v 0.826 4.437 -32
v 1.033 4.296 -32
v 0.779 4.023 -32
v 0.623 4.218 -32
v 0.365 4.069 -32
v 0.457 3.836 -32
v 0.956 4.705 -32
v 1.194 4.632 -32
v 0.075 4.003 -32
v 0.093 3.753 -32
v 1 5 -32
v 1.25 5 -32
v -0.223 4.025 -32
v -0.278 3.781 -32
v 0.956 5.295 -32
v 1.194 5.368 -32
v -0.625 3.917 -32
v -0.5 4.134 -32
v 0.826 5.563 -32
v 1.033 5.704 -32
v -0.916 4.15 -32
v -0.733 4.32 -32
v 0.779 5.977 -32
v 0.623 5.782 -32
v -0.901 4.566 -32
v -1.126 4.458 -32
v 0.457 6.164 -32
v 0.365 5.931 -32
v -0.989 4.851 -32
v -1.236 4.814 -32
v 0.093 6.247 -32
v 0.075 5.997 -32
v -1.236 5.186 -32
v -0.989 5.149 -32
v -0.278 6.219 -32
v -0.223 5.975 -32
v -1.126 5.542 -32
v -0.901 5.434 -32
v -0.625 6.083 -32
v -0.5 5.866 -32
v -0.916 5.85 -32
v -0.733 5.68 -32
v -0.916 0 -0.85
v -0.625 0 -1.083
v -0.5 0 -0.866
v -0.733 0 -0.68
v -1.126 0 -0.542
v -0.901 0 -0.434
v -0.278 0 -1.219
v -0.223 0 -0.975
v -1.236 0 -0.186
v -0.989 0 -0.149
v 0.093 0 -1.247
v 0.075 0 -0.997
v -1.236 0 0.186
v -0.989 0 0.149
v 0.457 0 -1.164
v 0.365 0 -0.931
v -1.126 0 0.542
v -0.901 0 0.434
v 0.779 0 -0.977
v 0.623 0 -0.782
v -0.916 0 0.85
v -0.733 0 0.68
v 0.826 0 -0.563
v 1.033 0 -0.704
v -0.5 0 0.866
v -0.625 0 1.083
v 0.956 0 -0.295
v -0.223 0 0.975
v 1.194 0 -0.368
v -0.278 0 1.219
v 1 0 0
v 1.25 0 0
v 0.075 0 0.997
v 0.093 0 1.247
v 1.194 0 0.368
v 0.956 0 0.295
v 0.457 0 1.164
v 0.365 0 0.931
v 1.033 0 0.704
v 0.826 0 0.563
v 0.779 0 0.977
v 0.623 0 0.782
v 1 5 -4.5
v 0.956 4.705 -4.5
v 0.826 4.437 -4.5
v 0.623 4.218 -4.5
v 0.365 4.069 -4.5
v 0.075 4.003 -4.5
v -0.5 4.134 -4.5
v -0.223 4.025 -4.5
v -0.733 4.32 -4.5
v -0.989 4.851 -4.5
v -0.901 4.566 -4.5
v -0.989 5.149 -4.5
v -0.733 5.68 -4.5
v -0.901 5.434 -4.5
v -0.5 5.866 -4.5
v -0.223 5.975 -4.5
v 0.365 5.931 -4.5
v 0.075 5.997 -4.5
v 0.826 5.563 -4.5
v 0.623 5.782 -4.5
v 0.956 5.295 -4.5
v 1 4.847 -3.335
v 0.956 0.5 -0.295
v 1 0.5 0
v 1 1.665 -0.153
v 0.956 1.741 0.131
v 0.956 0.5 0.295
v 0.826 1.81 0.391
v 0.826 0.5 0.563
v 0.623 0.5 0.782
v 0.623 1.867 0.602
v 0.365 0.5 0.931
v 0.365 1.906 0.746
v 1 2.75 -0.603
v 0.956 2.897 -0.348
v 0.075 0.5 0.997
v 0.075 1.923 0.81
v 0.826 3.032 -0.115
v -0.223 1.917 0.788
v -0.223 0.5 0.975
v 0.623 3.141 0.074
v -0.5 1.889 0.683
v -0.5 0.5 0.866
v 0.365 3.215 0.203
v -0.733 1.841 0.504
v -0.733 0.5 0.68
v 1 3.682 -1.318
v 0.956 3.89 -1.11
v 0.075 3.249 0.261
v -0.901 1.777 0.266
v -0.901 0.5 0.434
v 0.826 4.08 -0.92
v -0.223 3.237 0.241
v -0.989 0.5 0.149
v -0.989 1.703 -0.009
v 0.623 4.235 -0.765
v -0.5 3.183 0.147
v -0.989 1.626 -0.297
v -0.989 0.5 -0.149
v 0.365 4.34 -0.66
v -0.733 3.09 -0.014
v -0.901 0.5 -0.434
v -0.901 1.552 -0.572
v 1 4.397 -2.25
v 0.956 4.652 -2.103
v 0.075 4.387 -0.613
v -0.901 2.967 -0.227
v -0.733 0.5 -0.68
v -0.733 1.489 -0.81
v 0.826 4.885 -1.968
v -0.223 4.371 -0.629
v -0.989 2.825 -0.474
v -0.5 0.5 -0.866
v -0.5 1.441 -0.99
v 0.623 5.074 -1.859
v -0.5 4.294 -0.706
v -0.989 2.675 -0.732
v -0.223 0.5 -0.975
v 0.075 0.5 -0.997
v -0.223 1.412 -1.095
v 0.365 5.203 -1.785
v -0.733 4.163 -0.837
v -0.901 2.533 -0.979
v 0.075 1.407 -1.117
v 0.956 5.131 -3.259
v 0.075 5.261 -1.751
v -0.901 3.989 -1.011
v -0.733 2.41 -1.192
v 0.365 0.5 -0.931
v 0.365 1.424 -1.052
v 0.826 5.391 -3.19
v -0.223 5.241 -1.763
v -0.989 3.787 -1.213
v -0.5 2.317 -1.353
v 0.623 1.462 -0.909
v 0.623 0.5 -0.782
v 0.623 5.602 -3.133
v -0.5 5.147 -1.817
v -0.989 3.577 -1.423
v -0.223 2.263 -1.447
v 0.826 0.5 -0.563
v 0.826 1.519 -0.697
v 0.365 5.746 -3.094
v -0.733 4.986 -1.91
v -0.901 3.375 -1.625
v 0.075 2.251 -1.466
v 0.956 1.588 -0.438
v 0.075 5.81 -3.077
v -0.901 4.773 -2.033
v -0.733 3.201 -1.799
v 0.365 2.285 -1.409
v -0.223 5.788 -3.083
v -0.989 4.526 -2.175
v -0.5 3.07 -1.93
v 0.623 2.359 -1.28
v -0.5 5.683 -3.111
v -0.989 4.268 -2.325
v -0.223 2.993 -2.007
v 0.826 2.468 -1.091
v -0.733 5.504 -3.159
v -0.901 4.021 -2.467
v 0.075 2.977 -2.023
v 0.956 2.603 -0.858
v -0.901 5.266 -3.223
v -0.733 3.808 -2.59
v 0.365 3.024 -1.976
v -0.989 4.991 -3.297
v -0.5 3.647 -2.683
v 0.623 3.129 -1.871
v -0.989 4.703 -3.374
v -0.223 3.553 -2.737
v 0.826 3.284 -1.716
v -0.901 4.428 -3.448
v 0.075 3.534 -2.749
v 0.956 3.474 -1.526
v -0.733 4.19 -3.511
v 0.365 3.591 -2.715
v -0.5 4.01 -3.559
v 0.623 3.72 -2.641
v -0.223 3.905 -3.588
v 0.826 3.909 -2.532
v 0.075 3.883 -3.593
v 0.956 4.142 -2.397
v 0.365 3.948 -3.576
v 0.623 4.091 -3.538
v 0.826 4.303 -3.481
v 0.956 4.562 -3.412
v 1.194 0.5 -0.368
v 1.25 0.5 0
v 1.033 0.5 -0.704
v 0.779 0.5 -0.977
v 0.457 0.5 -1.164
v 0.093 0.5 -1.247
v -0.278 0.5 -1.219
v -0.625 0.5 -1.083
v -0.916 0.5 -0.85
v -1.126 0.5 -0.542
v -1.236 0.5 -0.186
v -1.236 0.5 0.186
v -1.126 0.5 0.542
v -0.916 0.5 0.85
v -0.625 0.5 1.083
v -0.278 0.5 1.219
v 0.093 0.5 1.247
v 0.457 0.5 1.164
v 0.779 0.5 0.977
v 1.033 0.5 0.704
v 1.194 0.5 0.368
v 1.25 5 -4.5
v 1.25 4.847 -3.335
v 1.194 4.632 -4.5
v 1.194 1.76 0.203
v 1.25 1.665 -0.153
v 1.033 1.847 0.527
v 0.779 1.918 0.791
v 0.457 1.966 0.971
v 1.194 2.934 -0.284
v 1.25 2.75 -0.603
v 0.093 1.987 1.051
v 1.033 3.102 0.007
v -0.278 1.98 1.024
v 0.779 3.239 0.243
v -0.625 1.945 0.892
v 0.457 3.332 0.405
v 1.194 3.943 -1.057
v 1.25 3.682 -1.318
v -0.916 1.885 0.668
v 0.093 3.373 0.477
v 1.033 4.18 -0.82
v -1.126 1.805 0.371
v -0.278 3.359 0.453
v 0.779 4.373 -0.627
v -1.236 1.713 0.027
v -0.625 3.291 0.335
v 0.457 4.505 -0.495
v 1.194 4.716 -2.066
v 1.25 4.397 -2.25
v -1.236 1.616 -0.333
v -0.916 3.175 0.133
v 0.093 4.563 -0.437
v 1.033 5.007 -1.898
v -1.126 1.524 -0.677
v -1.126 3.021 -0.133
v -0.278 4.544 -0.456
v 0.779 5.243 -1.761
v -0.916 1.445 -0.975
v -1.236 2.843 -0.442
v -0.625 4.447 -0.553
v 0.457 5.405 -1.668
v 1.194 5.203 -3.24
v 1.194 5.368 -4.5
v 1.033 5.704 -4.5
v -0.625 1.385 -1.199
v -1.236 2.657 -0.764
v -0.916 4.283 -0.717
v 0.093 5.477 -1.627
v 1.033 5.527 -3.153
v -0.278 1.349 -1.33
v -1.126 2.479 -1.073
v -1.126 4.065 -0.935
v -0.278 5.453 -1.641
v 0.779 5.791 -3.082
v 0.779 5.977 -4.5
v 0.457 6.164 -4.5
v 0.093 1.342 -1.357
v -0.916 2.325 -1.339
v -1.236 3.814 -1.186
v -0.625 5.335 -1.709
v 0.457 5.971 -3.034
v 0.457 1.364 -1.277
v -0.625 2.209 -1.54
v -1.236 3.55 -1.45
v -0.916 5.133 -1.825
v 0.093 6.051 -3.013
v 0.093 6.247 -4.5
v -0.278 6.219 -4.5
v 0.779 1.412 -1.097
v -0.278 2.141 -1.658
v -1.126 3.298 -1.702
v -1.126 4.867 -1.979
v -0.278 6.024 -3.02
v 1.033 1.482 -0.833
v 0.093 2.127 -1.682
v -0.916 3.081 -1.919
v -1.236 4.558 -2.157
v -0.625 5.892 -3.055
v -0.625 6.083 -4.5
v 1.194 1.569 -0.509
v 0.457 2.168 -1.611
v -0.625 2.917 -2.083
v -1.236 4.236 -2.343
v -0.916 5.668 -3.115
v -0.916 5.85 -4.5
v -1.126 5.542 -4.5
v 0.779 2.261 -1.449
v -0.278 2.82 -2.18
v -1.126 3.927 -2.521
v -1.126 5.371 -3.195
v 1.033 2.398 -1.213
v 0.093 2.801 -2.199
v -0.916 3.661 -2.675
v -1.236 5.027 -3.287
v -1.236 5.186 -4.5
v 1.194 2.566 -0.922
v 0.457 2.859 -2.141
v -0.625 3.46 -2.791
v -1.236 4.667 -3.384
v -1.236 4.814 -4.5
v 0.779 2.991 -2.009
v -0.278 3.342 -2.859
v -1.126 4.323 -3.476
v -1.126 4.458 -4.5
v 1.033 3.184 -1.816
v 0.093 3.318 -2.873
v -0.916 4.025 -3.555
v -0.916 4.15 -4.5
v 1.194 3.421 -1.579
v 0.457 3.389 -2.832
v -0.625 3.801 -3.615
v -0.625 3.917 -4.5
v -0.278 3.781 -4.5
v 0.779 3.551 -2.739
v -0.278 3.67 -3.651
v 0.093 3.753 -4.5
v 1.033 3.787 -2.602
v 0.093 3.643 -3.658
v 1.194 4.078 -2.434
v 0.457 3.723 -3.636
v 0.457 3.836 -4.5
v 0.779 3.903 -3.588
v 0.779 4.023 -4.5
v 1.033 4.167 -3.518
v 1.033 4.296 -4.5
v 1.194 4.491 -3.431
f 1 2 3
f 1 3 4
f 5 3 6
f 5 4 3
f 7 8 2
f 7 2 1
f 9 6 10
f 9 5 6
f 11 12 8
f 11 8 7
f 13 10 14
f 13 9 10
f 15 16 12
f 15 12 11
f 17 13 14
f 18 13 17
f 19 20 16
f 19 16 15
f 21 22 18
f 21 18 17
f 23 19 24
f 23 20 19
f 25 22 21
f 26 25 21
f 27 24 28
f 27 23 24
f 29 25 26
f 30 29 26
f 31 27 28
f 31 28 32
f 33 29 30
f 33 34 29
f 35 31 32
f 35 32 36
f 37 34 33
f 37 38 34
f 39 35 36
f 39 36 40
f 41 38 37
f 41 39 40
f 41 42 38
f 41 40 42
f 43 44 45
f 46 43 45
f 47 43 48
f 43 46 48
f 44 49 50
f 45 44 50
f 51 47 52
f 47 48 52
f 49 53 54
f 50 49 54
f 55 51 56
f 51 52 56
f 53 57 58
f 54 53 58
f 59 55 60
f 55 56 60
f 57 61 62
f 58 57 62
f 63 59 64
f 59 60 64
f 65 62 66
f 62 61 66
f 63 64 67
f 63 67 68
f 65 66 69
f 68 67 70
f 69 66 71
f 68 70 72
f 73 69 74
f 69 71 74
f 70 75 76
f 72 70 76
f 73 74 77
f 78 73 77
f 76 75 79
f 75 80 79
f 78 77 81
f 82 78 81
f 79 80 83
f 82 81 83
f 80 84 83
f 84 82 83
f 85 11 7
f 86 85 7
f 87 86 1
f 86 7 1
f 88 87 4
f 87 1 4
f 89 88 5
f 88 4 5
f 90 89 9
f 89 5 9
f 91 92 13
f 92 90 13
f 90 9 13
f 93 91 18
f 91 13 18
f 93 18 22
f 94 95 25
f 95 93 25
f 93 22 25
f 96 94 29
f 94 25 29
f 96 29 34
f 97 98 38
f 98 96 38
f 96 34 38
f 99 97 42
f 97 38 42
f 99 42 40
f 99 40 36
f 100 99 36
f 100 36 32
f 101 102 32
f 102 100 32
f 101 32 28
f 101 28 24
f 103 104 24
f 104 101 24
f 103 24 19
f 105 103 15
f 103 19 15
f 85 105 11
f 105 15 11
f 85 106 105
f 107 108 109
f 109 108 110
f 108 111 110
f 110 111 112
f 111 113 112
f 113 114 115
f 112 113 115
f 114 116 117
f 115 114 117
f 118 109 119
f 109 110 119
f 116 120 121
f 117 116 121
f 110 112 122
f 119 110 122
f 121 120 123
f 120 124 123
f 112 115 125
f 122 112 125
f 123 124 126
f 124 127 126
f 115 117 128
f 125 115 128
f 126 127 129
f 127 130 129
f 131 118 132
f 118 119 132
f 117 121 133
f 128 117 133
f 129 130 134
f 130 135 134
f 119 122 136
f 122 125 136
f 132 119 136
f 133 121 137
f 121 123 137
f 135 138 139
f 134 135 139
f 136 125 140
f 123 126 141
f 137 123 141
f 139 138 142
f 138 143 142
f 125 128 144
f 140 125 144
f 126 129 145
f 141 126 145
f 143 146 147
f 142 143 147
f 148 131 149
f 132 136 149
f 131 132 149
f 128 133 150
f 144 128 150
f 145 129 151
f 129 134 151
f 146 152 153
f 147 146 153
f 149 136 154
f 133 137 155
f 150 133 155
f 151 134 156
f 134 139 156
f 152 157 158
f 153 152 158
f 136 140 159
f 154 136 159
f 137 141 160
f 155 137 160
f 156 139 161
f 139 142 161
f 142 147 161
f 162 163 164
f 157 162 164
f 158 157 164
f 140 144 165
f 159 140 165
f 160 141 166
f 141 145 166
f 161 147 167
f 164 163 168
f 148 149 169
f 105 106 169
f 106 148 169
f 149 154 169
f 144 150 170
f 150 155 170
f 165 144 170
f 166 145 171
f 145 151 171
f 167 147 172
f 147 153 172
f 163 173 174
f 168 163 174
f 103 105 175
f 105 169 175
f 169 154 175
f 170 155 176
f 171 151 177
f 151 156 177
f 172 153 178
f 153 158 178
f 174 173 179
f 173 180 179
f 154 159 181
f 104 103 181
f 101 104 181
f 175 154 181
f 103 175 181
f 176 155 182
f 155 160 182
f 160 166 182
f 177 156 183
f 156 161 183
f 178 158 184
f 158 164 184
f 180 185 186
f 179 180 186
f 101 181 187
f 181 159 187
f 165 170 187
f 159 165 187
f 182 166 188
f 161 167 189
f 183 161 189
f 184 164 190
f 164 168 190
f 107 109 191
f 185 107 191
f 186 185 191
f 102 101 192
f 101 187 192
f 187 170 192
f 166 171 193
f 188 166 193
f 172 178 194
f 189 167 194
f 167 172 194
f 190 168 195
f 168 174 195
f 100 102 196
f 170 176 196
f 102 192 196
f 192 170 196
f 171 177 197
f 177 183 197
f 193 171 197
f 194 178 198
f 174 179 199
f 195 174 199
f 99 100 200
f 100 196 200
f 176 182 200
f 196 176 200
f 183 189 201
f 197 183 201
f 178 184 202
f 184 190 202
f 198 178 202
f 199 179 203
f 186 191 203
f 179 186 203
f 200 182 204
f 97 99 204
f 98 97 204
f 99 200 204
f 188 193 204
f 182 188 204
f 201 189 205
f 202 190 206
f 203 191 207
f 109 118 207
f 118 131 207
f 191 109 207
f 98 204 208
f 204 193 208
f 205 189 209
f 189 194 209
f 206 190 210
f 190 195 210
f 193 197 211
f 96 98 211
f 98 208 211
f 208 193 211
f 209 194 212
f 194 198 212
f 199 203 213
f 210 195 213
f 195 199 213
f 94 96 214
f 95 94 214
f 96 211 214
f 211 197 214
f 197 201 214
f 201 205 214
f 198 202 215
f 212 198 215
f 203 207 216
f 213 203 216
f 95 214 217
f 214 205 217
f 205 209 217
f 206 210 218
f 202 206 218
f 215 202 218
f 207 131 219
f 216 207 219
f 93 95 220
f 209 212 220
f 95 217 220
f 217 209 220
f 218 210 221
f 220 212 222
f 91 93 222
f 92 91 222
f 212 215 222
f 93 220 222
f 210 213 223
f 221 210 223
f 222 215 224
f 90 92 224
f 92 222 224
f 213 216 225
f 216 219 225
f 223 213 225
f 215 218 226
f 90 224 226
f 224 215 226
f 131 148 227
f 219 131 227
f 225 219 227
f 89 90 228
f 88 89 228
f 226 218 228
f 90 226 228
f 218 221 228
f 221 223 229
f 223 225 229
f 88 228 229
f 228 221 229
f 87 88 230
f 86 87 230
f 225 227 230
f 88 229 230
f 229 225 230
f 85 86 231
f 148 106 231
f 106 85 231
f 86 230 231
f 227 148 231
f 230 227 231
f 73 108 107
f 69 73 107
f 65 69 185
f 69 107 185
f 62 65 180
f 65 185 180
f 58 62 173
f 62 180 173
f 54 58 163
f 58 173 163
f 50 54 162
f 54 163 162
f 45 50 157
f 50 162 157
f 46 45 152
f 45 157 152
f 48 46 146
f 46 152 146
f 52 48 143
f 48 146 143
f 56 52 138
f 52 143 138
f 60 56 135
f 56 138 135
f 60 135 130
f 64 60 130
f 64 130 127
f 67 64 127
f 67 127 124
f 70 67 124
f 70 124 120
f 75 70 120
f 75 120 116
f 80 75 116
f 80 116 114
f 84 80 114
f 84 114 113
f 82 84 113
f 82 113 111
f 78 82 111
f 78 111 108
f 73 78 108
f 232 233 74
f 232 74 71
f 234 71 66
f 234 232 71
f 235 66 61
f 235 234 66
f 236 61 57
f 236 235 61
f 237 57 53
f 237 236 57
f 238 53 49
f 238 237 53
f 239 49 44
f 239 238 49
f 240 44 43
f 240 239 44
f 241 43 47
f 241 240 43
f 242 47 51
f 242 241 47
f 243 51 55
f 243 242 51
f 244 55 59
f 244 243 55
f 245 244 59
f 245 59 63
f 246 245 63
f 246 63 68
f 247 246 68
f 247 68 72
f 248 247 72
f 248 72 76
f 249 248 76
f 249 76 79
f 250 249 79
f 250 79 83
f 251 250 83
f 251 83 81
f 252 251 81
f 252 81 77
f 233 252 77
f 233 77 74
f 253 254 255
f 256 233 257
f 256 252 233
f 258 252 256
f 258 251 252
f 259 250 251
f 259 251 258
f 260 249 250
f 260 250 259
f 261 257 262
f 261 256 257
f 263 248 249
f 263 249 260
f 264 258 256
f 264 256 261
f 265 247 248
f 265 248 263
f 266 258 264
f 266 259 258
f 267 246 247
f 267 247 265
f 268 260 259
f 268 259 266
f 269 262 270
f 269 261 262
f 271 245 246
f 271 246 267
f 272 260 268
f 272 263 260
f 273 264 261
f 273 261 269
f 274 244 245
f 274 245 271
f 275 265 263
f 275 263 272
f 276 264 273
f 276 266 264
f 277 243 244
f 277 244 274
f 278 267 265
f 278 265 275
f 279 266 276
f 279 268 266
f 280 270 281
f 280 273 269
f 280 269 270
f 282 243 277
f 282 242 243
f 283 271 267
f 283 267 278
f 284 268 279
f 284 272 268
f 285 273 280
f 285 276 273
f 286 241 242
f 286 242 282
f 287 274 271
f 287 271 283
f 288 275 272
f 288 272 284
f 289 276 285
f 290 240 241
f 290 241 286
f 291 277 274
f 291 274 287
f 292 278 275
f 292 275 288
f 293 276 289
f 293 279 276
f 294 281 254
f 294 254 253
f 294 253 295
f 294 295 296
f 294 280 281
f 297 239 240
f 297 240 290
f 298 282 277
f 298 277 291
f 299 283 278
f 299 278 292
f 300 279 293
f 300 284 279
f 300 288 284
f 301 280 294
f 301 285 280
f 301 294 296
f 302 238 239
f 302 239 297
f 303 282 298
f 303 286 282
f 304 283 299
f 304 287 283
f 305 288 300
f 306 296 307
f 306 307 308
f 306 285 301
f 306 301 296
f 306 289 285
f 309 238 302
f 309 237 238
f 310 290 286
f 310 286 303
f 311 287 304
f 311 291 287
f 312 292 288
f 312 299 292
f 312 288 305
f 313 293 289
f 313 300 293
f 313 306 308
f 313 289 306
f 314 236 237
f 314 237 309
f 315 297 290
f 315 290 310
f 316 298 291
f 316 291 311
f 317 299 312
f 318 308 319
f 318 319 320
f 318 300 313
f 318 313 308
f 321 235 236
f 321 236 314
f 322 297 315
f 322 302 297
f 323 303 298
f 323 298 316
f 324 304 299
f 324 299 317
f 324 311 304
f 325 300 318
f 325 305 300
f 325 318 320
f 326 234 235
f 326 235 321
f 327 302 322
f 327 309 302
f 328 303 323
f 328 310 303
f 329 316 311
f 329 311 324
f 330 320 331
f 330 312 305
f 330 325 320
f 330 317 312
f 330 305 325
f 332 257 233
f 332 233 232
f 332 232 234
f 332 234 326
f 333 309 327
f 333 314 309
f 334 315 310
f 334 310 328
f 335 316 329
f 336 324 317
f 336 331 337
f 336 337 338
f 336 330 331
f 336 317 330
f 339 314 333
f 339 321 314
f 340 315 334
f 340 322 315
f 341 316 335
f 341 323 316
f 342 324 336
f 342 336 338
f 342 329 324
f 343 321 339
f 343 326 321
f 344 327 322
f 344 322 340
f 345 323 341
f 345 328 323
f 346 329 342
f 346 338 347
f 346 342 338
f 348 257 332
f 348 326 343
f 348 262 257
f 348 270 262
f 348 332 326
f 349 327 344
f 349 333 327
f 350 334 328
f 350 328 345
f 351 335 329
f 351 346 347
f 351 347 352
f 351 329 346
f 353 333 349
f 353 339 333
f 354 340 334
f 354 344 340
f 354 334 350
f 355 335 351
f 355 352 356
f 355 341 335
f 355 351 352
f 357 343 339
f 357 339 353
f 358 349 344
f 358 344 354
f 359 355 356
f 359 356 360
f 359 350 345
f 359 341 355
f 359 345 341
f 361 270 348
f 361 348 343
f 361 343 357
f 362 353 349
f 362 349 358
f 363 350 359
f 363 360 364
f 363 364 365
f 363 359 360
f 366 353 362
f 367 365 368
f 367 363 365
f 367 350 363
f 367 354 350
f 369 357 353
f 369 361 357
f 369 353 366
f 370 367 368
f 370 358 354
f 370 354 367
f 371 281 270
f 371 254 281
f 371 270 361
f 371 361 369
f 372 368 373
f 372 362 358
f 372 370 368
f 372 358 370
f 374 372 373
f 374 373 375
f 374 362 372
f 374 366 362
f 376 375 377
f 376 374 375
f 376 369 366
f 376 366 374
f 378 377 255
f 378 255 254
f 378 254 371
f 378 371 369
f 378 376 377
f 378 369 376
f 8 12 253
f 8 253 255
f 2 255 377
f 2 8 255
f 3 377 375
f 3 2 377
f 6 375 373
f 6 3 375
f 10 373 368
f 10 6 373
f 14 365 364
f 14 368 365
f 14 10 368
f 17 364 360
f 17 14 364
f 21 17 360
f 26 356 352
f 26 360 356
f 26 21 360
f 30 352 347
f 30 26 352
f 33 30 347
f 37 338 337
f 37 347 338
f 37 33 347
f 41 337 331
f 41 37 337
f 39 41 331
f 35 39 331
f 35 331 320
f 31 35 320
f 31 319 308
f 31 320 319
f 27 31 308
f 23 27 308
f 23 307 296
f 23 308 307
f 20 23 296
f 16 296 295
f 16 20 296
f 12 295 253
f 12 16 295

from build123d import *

# Parameters (mm, degrees)
SKIZZE2_R   = 1.25
SKIZZE2_R_2 = 1


with BuildPart() as part:
    # Austragung1: sweep along a path in Skizze1
    with BuildLine(Plane(origin=(0, 0, 0), x_dir=(0, 0, -1), z_dir=(1, 0, 0))) as austragung1_path:
        Line((0, 0), (0, 0.5))
        ThreePointArc((0, 0.5), (1.318019485, 3.681980515), (4.5, 5))
        Line((4.5, 5), (32, 5))
    # Skizze2 → Austragung1 (sweep)
    with BuildSketch(Plane(origin=(0, 0, 0), x_dir=(1, 0, 0), z_dir=(0, 1, 0))):
        Circle(SKIZZE2_R)
        Circle(SKIZZE2_R_2, mode=Mode.SUBTRACT)
    sweep(path=austragung1_path.line)


solid = part.part
